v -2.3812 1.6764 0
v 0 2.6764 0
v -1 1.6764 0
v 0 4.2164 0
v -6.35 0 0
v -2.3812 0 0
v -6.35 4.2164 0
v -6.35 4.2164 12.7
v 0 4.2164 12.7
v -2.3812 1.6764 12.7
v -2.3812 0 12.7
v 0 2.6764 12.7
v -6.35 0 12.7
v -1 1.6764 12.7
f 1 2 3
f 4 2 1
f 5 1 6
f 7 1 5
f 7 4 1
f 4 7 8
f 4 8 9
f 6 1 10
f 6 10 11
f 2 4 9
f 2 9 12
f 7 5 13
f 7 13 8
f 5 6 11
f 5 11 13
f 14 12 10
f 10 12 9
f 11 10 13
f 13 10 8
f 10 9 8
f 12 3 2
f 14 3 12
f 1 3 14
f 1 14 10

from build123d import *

# Parameters (mm, degrees)
PAD_DEPTH    = 12.7
CHAMFER_SIZE = 1


with BuildPart() as part:
    # Sketch → Pad (new body)
    with BuildSketch(Plane.XY):
        Polygon((-6.35, 0), (-6.35, 4.2164), (0, 4.2164), (0, 1.6764), (-2.38125, 1.6764), (-2.38125, 0), align=None)
    extrude(amount=PAD_DEPTH)

    # Chamfer
    chamfer_edges = [part.edges().sort_by_distance(p)[0] for p in [
        (0, 1.6764, 6.35),
    ]]
    chamfer(chamfer_edges, length=CHAMFER_SIZE)


solid = part.part
